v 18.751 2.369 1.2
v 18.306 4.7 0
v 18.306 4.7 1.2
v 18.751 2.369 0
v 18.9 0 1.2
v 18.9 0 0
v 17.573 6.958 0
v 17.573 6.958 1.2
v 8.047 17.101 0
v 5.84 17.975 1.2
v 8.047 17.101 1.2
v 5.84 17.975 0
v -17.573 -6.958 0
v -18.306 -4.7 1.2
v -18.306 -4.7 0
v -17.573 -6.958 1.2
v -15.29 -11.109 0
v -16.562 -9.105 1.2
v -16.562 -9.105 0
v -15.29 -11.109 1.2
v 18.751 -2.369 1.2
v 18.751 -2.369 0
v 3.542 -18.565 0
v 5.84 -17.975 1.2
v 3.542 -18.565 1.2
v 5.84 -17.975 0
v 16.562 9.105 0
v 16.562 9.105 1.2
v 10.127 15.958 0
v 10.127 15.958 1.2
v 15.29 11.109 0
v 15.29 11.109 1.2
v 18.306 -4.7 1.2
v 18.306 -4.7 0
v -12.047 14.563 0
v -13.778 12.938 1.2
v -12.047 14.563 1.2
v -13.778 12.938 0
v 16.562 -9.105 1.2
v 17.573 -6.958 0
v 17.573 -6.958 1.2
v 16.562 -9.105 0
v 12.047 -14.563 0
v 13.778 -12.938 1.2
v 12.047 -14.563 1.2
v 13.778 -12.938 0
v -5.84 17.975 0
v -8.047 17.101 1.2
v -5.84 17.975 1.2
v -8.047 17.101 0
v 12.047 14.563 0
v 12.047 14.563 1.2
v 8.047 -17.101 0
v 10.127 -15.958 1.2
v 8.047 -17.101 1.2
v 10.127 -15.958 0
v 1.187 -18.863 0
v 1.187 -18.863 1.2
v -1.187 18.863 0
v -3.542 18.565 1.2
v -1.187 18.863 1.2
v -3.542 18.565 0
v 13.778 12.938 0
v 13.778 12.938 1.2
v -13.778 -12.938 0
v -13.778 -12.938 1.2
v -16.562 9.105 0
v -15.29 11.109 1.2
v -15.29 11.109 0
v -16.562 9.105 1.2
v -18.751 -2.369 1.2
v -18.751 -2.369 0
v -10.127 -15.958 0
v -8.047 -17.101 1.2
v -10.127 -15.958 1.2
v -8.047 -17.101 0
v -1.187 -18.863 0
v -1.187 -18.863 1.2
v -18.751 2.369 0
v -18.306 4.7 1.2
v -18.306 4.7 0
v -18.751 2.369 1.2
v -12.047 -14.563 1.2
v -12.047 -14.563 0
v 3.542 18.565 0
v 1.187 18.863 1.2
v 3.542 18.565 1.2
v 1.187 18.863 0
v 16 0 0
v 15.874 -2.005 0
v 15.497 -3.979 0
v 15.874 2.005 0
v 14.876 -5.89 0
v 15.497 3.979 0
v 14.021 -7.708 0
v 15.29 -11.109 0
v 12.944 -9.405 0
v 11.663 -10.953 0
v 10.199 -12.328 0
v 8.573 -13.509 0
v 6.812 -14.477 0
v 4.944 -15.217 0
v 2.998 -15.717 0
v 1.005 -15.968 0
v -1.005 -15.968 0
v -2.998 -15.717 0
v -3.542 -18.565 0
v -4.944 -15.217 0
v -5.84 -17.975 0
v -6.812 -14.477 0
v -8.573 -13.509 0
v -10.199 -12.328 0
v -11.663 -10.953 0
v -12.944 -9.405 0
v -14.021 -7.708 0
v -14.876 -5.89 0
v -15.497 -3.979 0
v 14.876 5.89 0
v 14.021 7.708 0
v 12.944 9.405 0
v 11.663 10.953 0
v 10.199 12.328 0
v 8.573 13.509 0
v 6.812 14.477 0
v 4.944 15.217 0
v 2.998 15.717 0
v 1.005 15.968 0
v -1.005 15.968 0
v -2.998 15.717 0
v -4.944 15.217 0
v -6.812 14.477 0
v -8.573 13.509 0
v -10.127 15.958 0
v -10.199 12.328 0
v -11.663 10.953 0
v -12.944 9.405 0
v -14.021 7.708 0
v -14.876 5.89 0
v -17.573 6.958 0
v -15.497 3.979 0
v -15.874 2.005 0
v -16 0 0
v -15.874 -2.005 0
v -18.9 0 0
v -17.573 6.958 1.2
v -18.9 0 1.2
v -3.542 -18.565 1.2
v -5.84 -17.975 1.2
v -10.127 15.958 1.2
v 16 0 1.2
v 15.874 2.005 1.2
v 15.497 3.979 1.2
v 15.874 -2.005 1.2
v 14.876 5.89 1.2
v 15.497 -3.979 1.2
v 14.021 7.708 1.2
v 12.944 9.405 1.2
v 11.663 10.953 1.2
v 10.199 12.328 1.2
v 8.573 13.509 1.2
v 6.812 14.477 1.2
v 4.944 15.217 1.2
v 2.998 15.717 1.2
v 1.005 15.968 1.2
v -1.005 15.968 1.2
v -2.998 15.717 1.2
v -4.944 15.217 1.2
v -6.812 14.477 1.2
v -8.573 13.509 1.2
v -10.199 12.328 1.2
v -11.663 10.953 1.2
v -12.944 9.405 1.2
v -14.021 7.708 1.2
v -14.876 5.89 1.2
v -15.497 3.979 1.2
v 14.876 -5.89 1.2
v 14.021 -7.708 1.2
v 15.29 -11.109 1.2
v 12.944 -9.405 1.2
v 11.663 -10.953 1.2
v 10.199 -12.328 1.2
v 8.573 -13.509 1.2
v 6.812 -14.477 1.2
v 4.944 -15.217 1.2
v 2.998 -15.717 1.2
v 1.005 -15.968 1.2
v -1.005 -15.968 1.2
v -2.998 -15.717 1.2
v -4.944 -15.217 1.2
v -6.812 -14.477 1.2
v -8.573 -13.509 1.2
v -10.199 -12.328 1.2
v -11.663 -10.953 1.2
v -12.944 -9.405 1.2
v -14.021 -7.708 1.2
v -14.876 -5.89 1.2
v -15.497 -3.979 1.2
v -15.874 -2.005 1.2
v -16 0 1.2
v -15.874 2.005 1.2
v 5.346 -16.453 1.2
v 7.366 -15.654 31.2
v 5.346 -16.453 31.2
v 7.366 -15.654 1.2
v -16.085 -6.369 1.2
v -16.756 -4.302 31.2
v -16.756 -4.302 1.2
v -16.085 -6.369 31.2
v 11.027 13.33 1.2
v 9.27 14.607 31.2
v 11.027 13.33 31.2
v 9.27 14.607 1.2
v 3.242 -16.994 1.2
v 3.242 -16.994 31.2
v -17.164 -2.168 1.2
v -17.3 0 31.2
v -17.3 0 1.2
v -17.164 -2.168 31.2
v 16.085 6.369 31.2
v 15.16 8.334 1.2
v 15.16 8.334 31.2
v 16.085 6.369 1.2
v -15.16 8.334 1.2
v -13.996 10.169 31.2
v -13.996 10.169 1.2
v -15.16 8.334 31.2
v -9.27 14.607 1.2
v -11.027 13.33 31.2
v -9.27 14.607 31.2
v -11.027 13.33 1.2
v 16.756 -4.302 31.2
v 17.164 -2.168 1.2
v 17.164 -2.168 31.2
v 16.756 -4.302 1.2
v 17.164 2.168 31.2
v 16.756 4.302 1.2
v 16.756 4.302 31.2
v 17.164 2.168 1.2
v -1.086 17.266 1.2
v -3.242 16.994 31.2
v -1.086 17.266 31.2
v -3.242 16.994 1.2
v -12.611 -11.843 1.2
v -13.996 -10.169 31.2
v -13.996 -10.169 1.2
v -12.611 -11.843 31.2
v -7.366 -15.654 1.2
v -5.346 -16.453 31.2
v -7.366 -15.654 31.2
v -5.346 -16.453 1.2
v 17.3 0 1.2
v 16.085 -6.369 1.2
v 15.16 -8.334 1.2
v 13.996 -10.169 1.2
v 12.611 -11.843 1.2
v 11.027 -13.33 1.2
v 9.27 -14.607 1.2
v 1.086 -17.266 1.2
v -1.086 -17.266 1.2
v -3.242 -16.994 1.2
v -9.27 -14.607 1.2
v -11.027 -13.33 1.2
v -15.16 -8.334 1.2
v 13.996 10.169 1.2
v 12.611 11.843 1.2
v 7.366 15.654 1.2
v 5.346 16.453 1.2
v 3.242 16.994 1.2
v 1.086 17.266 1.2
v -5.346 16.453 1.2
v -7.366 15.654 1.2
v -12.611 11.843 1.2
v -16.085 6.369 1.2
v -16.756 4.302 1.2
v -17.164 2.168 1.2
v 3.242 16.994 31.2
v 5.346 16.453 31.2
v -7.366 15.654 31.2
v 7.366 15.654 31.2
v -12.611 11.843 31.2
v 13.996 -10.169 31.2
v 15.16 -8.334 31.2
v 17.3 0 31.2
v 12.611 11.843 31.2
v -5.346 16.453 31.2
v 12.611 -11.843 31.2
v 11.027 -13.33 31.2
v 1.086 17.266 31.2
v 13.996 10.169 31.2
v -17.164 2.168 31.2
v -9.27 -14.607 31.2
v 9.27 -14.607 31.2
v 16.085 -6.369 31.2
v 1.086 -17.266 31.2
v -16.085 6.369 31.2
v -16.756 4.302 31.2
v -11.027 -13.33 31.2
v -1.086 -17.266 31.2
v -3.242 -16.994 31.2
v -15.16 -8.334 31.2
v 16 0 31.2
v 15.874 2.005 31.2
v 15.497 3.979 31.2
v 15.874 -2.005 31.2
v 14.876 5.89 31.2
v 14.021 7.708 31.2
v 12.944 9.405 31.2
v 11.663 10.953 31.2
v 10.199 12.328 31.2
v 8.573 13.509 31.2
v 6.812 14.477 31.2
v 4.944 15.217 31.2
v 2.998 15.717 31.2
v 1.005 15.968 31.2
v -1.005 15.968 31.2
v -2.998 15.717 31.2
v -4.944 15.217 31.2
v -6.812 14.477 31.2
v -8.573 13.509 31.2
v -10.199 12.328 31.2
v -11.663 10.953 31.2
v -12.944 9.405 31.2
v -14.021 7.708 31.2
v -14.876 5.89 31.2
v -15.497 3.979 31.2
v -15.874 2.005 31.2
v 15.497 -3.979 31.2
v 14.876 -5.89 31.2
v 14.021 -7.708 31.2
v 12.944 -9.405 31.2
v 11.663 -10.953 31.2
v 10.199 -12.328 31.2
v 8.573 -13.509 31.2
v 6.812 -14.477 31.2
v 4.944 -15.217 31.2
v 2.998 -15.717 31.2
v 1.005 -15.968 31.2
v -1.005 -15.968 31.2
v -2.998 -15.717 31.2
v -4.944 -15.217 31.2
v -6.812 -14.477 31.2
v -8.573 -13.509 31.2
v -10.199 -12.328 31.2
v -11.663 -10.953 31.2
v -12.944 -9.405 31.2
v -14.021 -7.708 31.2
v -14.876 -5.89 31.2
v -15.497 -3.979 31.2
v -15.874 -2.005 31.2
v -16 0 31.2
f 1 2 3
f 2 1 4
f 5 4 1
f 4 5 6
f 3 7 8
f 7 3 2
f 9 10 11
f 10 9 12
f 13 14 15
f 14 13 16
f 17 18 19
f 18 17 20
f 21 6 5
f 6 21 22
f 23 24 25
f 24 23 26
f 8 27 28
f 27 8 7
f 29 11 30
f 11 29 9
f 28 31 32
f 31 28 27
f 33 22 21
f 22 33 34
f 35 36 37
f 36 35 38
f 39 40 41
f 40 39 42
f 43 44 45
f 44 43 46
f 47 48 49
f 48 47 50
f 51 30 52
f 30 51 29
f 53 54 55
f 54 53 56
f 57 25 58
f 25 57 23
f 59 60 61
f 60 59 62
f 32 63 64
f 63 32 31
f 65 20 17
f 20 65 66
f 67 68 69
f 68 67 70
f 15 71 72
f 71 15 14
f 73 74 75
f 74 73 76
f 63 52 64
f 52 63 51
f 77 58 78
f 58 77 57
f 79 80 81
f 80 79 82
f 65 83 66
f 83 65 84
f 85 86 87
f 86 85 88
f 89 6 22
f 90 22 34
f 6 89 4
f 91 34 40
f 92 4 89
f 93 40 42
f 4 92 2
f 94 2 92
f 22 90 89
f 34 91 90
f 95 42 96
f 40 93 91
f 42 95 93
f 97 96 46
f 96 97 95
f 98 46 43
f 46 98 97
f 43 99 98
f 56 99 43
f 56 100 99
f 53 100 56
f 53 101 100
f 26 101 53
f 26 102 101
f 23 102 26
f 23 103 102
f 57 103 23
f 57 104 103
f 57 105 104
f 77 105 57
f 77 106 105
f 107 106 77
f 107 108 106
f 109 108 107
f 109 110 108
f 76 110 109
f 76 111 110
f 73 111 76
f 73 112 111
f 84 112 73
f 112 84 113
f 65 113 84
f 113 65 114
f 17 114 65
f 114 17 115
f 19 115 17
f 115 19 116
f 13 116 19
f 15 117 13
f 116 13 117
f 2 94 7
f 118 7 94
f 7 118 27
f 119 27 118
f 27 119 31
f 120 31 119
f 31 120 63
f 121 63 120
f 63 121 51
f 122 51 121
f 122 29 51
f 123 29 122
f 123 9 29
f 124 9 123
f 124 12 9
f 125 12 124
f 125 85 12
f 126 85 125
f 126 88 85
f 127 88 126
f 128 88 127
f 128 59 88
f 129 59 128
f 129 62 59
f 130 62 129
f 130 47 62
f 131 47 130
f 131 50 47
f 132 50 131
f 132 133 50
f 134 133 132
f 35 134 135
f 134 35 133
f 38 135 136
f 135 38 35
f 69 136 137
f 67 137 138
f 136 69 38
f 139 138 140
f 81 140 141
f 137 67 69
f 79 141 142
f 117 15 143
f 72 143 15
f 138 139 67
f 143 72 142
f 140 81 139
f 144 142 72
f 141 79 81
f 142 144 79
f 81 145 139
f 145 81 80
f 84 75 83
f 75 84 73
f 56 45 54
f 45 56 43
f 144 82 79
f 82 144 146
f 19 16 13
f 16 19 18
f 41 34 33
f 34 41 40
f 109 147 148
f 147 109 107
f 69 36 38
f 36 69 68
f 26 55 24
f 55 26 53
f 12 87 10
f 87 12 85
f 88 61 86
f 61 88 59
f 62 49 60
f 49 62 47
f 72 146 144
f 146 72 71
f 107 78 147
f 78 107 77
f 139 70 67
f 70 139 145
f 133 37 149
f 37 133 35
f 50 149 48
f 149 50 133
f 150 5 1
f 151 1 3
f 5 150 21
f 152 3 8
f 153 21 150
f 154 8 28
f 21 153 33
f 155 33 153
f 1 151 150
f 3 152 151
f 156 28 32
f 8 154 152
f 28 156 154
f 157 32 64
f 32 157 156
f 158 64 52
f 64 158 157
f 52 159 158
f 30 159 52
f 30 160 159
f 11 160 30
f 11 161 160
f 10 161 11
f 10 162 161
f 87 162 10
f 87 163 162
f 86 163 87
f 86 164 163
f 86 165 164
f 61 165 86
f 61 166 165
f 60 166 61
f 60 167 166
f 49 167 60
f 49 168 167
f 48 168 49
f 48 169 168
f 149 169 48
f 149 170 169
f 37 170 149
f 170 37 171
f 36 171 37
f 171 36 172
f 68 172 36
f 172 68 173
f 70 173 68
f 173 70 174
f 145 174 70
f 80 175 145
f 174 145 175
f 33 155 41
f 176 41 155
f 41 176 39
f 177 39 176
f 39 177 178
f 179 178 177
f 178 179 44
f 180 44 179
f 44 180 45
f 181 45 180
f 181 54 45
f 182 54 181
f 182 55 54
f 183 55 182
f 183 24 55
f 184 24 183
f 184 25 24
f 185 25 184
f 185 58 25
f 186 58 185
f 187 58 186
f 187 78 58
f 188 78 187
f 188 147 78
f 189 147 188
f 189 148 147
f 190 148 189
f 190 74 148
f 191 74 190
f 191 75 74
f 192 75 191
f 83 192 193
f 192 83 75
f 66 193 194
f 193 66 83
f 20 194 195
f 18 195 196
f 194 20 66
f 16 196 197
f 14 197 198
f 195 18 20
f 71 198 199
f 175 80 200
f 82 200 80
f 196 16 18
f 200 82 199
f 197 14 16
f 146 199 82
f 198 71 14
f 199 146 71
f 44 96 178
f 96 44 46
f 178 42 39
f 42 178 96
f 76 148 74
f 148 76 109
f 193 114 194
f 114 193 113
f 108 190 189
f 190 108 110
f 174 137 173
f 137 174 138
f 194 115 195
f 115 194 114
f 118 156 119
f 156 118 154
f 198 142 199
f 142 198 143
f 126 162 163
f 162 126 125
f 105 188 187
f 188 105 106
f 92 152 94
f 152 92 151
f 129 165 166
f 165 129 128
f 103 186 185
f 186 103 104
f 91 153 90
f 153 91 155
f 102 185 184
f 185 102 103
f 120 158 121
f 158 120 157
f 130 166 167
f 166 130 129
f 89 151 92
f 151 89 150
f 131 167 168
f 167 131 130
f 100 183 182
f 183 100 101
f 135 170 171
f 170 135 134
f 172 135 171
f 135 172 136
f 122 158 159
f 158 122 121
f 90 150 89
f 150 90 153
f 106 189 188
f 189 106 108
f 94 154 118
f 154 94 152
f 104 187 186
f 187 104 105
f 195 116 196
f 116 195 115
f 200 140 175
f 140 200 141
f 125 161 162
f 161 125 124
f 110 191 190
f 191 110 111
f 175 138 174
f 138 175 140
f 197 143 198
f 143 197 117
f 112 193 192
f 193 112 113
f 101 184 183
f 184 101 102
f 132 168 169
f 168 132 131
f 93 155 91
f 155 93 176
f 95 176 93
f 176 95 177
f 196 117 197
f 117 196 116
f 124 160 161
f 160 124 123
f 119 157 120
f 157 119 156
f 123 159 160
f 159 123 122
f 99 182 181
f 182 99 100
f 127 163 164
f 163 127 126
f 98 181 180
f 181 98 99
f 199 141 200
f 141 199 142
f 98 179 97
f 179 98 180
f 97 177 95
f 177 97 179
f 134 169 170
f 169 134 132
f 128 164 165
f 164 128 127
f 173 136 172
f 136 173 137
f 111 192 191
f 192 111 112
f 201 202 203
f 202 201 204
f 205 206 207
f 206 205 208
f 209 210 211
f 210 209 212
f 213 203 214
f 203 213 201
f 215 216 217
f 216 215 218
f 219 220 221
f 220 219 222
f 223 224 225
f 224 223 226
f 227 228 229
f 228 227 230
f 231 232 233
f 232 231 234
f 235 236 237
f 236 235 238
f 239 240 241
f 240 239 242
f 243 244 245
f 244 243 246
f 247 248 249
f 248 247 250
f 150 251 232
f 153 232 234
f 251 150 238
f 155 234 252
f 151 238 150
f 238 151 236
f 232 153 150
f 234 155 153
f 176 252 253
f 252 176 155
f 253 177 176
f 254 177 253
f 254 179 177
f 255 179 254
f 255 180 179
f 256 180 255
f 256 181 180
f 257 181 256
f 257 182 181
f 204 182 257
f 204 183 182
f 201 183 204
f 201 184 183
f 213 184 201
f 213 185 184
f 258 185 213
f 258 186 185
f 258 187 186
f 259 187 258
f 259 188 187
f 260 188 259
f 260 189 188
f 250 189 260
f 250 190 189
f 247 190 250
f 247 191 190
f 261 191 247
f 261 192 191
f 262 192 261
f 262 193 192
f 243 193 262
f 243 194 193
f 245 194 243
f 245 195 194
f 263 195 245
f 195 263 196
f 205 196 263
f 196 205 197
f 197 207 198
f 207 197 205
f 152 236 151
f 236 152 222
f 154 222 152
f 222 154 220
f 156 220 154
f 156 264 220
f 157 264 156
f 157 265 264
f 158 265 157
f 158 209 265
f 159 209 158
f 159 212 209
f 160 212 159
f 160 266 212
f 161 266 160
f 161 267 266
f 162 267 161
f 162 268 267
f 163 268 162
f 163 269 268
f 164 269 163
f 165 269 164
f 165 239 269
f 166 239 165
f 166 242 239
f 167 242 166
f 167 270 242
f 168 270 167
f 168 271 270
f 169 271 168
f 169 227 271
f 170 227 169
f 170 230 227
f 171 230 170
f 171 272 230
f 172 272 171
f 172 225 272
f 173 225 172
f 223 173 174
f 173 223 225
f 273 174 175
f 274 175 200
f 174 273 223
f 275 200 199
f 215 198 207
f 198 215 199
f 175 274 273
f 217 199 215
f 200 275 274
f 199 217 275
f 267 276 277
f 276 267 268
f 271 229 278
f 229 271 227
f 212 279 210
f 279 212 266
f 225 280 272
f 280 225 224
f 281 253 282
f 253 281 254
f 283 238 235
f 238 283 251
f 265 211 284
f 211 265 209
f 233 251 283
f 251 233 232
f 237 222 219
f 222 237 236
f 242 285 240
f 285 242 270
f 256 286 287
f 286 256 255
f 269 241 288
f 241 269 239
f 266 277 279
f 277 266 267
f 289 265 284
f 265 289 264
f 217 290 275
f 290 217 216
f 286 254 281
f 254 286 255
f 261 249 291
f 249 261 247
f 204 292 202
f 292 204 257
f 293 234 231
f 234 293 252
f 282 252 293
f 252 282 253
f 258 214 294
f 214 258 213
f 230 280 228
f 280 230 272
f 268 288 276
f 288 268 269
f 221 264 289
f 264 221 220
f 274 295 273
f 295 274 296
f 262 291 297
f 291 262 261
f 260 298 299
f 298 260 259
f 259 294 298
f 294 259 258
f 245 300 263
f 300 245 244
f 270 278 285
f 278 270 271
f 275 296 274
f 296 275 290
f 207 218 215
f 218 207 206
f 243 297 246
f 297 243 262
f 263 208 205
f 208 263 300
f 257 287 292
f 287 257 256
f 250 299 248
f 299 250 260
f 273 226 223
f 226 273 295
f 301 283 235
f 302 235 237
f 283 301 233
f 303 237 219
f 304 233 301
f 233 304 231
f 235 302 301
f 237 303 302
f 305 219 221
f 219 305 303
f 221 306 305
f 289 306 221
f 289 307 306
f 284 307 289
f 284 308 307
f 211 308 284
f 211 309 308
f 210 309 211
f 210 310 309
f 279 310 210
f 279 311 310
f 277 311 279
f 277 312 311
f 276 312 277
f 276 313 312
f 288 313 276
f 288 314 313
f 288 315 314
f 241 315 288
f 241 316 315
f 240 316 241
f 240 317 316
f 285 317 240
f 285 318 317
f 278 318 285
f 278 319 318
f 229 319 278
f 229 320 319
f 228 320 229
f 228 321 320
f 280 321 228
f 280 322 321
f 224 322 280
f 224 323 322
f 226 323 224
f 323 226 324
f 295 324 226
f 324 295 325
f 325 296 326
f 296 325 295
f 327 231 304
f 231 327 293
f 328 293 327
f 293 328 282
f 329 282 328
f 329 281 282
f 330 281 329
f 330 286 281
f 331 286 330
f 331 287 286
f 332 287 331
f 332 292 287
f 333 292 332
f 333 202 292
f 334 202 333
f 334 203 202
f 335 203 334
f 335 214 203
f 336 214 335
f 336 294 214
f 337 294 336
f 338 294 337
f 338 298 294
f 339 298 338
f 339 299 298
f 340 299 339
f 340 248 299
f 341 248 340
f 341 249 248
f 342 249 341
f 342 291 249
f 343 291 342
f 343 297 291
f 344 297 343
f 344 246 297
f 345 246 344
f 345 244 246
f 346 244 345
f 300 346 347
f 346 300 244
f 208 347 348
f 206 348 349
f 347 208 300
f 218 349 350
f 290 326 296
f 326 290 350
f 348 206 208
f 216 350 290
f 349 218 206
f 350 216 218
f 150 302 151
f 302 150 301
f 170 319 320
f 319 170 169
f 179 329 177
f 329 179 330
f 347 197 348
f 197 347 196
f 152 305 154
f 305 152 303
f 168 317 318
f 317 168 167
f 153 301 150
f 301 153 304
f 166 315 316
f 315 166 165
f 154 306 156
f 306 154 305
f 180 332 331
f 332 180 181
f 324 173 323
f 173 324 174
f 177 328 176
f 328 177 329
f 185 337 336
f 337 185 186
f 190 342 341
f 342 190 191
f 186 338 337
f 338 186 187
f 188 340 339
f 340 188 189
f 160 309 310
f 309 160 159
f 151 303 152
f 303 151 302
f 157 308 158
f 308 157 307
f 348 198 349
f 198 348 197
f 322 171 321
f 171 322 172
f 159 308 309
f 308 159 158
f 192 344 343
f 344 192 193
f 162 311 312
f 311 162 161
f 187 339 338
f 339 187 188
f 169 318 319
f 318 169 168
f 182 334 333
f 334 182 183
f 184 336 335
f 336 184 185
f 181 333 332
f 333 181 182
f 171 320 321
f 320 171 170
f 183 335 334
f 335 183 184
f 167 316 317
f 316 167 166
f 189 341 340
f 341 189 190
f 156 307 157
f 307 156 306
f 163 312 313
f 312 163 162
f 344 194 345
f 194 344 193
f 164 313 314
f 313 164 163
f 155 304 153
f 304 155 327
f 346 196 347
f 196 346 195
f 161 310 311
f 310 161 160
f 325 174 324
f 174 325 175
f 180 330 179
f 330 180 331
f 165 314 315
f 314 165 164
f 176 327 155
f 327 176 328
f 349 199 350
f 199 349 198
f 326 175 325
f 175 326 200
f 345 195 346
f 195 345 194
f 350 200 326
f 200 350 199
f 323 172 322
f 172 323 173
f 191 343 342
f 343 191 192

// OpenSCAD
inner_diameter=32;
outer_diameter=34.6;
rim_height=1.2;
rim_width=1.6;
adapter_height=30;
$fn=50;

difference(){
  cylinder(h=rim_height,r=outer_diameter/2+rim_width);
  cylinder(h=rim_height,r=inner_diameter/2);
}

translate([0,0,rim_height]){
  difference(){
    cylinder(h=adapter_height,r=outer_diameter/2);
    cylinder(h=adapter_height,r=inner_diameter/2);
  }
}
